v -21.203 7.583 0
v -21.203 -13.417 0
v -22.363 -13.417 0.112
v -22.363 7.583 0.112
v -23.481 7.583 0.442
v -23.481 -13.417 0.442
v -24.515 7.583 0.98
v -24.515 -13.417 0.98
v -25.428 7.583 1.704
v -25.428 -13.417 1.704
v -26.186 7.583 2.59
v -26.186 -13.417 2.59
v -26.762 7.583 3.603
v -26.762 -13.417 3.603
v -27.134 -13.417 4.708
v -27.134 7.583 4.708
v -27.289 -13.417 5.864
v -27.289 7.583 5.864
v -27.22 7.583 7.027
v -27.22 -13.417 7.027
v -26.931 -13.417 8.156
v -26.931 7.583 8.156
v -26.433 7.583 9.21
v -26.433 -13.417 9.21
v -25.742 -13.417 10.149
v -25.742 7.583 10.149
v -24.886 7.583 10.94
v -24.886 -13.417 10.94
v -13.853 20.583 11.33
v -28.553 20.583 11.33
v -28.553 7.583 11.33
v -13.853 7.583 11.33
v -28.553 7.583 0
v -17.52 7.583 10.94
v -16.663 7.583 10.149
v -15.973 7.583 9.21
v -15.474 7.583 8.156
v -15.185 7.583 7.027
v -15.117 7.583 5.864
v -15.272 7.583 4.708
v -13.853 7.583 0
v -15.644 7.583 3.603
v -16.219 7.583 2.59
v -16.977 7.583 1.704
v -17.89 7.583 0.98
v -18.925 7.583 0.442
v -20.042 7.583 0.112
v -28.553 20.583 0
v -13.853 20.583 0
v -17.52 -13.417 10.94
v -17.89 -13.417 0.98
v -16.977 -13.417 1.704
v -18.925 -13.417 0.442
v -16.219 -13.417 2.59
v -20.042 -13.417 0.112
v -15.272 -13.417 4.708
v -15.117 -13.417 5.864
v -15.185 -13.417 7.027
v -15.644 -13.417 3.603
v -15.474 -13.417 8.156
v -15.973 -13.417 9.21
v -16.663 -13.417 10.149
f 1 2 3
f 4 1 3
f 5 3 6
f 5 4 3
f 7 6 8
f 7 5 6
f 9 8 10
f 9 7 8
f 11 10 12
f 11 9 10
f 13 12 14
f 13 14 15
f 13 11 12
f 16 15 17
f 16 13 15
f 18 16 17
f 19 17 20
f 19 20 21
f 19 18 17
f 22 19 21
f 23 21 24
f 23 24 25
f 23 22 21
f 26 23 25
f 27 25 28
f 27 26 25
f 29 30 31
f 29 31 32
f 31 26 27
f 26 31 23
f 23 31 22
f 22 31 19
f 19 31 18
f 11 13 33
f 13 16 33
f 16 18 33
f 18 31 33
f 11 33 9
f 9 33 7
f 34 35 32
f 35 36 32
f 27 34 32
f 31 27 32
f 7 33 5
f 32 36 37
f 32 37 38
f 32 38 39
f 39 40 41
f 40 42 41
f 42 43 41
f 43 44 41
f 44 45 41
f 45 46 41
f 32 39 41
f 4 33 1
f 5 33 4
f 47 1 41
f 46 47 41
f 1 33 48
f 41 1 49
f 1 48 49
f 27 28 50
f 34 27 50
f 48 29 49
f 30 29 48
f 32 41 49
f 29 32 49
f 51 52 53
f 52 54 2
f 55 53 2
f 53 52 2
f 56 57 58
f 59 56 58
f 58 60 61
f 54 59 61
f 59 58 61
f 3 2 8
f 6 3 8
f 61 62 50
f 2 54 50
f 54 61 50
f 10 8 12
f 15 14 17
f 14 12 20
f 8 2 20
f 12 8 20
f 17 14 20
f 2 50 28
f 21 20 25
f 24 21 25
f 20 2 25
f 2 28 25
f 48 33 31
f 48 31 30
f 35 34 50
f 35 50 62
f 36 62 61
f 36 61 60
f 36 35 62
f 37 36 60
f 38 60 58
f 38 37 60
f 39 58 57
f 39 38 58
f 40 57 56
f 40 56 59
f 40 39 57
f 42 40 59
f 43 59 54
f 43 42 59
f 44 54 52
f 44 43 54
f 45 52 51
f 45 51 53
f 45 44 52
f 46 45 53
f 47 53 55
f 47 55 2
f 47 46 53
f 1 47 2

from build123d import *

# Parameters (mm, degrees)
F0_W     = 14.7
F0_H     = 13
F1_DEPTH = 11.33
F3_DEPTH = 34


with BuildPart() as f1:
    # F0 (on Top) → F1 (new body)
    with BuildSketch(Plane.XY):
        with Locations((-21.202724, 14.082852)):
            Rectangle(F0_W, F0_H)
    extrude(amount=F1_DEPTH)

    # F2 (on face) → F3 (join)
    with BuildSketch(Plane(origin=(0, 20.582852, 0), x_dir=(-1, 0, 0), z_dir=(0, 1, 0))):
        with BuildLine():
            Line((24.885875, 10.94), (17.519573, 10.94))
            ThreePointArc((17.519573, 10.94), (15.431043, 4.146858), (21.202724, 0))
            ThreePointArc((21.202724, 0), (26.974405, 4.146858), (24.885875, 10.94))
        make_face()
    extrude(amount=-F3_DEPTH)


solid = f1.part
